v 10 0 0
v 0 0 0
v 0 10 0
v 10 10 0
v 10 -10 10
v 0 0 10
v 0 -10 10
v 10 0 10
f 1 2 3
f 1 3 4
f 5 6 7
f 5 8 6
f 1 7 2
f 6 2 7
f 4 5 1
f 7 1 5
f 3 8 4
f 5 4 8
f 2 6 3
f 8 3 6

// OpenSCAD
// segments= takes precedence over $fn: 8 vertices per ring, not 40.
linear_extrude(height = 10, twist = 90, slices = 1, segments = 8, $fn = 40) square(10);
